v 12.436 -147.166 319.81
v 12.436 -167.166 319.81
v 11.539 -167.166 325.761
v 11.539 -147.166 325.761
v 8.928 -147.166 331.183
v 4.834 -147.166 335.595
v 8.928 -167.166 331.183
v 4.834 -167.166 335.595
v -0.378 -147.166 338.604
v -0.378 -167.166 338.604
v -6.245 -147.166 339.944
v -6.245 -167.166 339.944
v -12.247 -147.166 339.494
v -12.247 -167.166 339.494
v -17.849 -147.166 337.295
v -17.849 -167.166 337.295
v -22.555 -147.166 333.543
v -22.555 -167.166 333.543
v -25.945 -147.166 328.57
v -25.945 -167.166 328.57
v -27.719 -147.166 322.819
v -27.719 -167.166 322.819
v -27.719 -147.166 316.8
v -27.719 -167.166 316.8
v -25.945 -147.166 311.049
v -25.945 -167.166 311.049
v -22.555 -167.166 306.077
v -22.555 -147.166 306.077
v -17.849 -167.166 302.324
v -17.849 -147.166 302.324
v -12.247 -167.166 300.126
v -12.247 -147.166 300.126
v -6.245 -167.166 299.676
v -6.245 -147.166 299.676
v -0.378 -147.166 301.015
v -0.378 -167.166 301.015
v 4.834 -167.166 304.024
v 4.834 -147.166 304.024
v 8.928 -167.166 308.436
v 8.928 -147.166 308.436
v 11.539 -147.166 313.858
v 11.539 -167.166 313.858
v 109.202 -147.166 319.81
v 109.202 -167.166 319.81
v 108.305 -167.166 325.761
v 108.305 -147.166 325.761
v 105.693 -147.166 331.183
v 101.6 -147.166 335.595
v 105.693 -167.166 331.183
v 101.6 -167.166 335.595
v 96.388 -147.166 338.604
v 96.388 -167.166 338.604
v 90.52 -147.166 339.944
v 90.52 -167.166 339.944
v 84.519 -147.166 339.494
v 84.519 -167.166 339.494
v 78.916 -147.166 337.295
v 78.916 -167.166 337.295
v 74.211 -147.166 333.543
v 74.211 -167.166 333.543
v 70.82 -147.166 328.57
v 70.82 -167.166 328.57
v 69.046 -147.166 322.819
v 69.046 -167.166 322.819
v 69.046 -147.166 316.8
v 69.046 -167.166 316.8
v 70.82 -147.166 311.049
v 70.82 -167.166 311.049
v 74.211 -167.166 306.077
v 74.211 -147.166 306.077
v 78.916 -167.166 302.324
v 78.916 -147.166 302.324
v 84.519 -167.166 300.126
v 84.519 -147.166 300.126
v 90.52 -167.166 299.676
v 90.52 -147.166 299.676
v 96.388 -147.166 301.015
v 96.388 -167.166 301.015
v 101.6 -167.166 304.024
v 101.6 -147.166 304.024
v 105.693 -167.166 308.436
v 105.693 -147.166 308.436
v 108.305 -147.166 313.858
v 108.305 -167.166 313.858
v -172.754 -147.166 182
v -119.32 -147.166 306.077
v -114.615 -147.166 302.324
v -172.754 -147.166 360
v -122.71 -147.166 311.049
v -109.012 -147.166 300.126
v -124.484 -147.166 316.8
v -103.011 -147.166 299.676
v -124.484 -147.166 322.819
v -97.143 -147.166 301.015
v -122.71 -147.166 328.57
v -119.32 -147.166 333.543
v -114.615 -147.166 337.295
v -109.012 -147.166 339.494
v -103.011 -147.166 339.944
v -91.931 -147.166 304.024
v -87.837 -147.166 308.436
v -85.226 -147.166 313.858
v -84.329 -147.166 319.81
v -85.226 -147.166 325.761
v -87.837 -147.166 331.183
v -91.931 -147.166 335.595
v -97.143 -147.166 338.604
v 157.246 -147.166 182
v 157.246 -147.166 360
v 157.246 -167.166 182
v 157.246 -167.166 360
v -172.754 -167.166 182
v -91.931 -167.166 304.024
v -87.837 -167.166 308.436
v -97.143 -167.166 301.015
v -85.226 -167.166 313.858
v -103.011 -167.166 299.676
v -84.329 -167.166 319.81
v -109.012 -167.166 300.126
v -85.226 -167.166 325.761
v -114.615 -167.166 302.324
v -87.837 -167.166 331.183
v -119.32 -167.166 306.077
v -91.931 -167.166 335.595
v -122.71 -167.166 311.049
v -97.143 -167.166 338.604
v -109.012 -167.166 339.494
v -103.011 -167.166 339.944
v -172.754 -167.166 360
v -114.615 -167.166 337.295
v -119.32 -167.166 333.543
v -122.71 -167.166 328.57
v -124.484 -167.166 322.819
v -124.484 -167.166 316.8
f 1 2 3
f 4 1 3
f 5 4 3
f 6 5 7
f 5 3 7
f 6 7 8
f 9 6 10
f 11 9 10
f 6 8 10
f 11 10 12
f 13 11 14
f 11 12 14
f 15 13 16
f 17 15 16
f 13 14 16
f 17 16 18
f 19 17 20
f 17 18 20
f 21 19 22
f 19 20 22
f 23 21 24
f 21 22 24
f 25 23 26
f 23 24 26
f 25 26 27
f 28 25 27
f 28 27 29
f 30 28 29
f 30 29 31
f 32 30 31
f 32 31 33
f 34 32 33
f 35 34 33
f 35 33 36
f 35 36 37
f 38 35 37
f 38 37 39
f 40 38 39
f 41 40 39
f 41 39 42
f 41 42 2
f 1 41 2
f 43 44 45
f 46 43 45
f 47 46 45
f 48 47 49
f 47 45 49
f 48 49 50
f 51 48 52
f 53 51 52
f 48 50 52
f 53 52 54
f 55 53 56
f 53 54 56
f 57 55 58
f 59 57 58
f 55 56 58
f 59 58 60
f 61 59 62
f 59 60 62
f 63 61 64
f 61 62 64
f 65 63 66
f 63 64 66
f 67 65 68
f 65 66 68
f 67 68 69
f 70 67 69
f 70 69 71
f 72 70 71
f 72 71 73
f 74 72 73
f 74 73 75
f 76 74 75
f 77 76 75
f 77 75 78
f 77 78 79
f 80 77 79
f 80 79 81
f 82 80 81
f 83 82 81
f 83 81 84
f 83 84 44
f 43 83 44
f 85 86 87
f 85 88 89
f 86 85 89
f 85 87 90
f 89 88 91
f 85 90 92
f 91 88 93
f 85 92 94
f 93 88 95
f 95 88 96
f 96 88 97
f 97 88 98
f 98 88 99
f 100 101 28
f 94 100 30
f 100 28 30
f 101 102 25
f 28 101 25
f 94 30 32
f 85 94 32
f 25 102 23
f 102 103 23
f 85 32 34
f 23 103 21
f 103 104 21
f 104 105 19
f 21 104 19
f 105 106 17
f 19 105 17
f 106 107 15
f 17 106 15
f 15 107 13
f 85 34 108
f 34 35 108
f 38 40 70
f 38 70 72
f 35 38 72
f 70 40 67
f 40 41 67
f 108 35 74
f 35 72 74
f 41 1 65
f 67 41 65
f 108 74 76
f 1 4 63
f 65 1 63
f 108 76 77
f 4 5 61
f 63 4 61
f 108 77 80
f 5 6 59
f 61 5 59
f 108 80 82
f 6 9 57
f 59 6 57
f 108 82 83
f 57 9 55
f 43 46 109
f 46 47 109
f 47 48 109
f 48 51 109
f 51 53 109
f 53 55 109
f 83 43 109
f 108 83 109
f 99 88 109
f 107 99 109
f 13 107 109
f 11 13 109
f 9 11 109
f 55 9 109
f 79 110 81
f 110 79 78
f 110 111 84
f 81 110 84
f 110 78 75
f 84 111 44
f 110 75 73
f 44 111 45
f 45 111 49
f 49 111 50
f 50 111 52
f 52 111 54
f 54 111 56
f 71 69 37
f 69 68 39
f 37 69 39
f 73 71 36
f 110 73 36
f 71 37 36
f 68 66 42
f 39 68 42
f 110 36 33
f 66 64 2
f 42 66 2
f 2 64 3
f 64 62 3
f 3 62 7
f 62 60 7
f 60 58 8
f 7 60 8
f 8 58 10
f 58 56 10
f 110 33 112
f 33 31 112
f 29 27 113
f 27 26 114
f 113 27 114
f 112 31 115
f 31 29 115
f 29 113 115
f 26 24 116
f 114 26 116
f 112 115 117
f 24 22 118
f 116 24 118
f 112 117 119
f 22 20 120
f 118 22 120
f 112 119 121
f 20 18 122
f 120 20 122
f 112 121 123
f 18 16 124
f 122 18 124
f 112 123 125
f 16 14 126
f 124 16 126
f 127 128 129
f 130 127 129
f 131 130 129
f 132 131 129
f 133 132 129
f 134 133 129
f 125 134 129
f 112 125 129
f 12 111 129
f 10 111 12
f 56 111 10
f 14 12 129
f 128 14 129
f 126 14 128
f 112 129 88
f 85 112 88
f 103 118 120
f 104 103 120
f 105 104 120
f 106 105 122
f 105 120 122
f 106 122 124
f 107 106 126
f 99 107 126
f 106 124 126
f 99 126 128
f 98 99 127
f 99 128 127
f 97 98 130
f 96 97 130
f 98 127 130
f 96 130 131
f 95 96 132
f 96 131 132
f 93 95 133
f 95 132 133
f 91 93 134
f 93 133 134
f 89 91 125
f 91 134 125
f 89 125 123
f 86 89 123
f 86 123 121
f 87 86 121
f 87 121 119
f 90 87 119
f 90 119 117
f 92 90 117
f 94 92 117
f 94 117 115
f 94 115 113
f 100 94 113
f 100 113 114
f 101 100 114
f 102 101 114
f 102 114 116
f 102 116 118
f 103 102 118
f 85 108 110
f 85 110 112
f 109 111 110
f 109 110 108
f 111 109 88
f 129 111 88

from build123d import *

# Parameters (mm, degrees)
CROQUIS1_W              = 165
CROQUIS1_H              = 20
SALIENTE_EXTRUIR1_DEPTH = 178
CORTAR_EXTRUIR1_REACH   = 401.805
CROQUIS2_R              = 20.190307202


with BuildPart() as part:
    # Croquis1 → Saliente-Extruir1 (new body)
    with BuildSketch(Plane(origin=(0, 0, 360), x_dir=(-1, 0, 0), z_dir=(0, 0, -1))):
        with Locations((-74.745907017, -157.165586138)):
            Rectangle(CROQUIS1_W, CROQUIS1_H)
        with Locations((90.254092983, -157.165586138)):
            Rectangle(CROQUIS1_W, CROQUIS1_H)
    extrude(amount=SALIENTE_EXTRUIR1_DEPTH)

    # Croquis2 → Cortar-Extruir1 (cut, up to next)
    with BuildSketch(Plane.XZ.offset(167.165586138), mode=Mode.PRIVATE) as cortar_extruir1_sk1:
        with Locations((-104.519454625, 319.809692798)):
            Circle(CROQUIS2_R)
    cortar_extruir1_tool1 = extrude(cortar_extruir1_sk1.sketch, amount=-CORTAR_EXTRUIR1_REACH, mode=Mode.PRIVATE) & part.part
    # Croquis2 → Cortar-Extruir1 (cut, up to next)
    with BuildSketch(Plane.XZ.offset(167.165586138), mode=Mode.PRIVATE) as cortar_extruir1_sk2:
        with Locations((-7.754092983, 319.809692798)):
            Circle(CROQUIS2_R)
    cortar_extruir1_tool2 = extrude(cortar_extruir1_sk2.sketch, amount=-CORTAR_EXTRUIR1_REACH, mode=Mode.PRIVATE) & part.part
    # Croquis2 → Cortar-Extruir1 (cut, up to next)
    with BuildSketch(Plane.XZ.offset(167.165586138), mode=Mode.PRIVATE) as cortar_extruir1_sk3:
        with Locations((89.011268658, 319.809692798)):
            Circle(CROQUIS2_R)
    cortar_extruir1_tool3 = extrude(cortar_extruir1_sk3.sketch, amount=-CORTAR_EXTRUIR1_REACH, mode=Mode.PRIVATE) & part.part
    add(cortar_extruir1_tool1.solids().sort_by_distance((-104.519455, -167.165586, 319.809693))[0], mode=Mode.SUBTRACT)
    add(cortar_extruir1_tool2.solids().sort_by_distance((-7.754093, -167.165586, 319.809693))[0], mode=Mode.SUBTRACT)
    add(cortar_extruir1_tool3.solids().sort_by_distance((89.011269, -167.165586, 319.809693))[0], mode=Mode.SUBTRACT)


solid = part.part
